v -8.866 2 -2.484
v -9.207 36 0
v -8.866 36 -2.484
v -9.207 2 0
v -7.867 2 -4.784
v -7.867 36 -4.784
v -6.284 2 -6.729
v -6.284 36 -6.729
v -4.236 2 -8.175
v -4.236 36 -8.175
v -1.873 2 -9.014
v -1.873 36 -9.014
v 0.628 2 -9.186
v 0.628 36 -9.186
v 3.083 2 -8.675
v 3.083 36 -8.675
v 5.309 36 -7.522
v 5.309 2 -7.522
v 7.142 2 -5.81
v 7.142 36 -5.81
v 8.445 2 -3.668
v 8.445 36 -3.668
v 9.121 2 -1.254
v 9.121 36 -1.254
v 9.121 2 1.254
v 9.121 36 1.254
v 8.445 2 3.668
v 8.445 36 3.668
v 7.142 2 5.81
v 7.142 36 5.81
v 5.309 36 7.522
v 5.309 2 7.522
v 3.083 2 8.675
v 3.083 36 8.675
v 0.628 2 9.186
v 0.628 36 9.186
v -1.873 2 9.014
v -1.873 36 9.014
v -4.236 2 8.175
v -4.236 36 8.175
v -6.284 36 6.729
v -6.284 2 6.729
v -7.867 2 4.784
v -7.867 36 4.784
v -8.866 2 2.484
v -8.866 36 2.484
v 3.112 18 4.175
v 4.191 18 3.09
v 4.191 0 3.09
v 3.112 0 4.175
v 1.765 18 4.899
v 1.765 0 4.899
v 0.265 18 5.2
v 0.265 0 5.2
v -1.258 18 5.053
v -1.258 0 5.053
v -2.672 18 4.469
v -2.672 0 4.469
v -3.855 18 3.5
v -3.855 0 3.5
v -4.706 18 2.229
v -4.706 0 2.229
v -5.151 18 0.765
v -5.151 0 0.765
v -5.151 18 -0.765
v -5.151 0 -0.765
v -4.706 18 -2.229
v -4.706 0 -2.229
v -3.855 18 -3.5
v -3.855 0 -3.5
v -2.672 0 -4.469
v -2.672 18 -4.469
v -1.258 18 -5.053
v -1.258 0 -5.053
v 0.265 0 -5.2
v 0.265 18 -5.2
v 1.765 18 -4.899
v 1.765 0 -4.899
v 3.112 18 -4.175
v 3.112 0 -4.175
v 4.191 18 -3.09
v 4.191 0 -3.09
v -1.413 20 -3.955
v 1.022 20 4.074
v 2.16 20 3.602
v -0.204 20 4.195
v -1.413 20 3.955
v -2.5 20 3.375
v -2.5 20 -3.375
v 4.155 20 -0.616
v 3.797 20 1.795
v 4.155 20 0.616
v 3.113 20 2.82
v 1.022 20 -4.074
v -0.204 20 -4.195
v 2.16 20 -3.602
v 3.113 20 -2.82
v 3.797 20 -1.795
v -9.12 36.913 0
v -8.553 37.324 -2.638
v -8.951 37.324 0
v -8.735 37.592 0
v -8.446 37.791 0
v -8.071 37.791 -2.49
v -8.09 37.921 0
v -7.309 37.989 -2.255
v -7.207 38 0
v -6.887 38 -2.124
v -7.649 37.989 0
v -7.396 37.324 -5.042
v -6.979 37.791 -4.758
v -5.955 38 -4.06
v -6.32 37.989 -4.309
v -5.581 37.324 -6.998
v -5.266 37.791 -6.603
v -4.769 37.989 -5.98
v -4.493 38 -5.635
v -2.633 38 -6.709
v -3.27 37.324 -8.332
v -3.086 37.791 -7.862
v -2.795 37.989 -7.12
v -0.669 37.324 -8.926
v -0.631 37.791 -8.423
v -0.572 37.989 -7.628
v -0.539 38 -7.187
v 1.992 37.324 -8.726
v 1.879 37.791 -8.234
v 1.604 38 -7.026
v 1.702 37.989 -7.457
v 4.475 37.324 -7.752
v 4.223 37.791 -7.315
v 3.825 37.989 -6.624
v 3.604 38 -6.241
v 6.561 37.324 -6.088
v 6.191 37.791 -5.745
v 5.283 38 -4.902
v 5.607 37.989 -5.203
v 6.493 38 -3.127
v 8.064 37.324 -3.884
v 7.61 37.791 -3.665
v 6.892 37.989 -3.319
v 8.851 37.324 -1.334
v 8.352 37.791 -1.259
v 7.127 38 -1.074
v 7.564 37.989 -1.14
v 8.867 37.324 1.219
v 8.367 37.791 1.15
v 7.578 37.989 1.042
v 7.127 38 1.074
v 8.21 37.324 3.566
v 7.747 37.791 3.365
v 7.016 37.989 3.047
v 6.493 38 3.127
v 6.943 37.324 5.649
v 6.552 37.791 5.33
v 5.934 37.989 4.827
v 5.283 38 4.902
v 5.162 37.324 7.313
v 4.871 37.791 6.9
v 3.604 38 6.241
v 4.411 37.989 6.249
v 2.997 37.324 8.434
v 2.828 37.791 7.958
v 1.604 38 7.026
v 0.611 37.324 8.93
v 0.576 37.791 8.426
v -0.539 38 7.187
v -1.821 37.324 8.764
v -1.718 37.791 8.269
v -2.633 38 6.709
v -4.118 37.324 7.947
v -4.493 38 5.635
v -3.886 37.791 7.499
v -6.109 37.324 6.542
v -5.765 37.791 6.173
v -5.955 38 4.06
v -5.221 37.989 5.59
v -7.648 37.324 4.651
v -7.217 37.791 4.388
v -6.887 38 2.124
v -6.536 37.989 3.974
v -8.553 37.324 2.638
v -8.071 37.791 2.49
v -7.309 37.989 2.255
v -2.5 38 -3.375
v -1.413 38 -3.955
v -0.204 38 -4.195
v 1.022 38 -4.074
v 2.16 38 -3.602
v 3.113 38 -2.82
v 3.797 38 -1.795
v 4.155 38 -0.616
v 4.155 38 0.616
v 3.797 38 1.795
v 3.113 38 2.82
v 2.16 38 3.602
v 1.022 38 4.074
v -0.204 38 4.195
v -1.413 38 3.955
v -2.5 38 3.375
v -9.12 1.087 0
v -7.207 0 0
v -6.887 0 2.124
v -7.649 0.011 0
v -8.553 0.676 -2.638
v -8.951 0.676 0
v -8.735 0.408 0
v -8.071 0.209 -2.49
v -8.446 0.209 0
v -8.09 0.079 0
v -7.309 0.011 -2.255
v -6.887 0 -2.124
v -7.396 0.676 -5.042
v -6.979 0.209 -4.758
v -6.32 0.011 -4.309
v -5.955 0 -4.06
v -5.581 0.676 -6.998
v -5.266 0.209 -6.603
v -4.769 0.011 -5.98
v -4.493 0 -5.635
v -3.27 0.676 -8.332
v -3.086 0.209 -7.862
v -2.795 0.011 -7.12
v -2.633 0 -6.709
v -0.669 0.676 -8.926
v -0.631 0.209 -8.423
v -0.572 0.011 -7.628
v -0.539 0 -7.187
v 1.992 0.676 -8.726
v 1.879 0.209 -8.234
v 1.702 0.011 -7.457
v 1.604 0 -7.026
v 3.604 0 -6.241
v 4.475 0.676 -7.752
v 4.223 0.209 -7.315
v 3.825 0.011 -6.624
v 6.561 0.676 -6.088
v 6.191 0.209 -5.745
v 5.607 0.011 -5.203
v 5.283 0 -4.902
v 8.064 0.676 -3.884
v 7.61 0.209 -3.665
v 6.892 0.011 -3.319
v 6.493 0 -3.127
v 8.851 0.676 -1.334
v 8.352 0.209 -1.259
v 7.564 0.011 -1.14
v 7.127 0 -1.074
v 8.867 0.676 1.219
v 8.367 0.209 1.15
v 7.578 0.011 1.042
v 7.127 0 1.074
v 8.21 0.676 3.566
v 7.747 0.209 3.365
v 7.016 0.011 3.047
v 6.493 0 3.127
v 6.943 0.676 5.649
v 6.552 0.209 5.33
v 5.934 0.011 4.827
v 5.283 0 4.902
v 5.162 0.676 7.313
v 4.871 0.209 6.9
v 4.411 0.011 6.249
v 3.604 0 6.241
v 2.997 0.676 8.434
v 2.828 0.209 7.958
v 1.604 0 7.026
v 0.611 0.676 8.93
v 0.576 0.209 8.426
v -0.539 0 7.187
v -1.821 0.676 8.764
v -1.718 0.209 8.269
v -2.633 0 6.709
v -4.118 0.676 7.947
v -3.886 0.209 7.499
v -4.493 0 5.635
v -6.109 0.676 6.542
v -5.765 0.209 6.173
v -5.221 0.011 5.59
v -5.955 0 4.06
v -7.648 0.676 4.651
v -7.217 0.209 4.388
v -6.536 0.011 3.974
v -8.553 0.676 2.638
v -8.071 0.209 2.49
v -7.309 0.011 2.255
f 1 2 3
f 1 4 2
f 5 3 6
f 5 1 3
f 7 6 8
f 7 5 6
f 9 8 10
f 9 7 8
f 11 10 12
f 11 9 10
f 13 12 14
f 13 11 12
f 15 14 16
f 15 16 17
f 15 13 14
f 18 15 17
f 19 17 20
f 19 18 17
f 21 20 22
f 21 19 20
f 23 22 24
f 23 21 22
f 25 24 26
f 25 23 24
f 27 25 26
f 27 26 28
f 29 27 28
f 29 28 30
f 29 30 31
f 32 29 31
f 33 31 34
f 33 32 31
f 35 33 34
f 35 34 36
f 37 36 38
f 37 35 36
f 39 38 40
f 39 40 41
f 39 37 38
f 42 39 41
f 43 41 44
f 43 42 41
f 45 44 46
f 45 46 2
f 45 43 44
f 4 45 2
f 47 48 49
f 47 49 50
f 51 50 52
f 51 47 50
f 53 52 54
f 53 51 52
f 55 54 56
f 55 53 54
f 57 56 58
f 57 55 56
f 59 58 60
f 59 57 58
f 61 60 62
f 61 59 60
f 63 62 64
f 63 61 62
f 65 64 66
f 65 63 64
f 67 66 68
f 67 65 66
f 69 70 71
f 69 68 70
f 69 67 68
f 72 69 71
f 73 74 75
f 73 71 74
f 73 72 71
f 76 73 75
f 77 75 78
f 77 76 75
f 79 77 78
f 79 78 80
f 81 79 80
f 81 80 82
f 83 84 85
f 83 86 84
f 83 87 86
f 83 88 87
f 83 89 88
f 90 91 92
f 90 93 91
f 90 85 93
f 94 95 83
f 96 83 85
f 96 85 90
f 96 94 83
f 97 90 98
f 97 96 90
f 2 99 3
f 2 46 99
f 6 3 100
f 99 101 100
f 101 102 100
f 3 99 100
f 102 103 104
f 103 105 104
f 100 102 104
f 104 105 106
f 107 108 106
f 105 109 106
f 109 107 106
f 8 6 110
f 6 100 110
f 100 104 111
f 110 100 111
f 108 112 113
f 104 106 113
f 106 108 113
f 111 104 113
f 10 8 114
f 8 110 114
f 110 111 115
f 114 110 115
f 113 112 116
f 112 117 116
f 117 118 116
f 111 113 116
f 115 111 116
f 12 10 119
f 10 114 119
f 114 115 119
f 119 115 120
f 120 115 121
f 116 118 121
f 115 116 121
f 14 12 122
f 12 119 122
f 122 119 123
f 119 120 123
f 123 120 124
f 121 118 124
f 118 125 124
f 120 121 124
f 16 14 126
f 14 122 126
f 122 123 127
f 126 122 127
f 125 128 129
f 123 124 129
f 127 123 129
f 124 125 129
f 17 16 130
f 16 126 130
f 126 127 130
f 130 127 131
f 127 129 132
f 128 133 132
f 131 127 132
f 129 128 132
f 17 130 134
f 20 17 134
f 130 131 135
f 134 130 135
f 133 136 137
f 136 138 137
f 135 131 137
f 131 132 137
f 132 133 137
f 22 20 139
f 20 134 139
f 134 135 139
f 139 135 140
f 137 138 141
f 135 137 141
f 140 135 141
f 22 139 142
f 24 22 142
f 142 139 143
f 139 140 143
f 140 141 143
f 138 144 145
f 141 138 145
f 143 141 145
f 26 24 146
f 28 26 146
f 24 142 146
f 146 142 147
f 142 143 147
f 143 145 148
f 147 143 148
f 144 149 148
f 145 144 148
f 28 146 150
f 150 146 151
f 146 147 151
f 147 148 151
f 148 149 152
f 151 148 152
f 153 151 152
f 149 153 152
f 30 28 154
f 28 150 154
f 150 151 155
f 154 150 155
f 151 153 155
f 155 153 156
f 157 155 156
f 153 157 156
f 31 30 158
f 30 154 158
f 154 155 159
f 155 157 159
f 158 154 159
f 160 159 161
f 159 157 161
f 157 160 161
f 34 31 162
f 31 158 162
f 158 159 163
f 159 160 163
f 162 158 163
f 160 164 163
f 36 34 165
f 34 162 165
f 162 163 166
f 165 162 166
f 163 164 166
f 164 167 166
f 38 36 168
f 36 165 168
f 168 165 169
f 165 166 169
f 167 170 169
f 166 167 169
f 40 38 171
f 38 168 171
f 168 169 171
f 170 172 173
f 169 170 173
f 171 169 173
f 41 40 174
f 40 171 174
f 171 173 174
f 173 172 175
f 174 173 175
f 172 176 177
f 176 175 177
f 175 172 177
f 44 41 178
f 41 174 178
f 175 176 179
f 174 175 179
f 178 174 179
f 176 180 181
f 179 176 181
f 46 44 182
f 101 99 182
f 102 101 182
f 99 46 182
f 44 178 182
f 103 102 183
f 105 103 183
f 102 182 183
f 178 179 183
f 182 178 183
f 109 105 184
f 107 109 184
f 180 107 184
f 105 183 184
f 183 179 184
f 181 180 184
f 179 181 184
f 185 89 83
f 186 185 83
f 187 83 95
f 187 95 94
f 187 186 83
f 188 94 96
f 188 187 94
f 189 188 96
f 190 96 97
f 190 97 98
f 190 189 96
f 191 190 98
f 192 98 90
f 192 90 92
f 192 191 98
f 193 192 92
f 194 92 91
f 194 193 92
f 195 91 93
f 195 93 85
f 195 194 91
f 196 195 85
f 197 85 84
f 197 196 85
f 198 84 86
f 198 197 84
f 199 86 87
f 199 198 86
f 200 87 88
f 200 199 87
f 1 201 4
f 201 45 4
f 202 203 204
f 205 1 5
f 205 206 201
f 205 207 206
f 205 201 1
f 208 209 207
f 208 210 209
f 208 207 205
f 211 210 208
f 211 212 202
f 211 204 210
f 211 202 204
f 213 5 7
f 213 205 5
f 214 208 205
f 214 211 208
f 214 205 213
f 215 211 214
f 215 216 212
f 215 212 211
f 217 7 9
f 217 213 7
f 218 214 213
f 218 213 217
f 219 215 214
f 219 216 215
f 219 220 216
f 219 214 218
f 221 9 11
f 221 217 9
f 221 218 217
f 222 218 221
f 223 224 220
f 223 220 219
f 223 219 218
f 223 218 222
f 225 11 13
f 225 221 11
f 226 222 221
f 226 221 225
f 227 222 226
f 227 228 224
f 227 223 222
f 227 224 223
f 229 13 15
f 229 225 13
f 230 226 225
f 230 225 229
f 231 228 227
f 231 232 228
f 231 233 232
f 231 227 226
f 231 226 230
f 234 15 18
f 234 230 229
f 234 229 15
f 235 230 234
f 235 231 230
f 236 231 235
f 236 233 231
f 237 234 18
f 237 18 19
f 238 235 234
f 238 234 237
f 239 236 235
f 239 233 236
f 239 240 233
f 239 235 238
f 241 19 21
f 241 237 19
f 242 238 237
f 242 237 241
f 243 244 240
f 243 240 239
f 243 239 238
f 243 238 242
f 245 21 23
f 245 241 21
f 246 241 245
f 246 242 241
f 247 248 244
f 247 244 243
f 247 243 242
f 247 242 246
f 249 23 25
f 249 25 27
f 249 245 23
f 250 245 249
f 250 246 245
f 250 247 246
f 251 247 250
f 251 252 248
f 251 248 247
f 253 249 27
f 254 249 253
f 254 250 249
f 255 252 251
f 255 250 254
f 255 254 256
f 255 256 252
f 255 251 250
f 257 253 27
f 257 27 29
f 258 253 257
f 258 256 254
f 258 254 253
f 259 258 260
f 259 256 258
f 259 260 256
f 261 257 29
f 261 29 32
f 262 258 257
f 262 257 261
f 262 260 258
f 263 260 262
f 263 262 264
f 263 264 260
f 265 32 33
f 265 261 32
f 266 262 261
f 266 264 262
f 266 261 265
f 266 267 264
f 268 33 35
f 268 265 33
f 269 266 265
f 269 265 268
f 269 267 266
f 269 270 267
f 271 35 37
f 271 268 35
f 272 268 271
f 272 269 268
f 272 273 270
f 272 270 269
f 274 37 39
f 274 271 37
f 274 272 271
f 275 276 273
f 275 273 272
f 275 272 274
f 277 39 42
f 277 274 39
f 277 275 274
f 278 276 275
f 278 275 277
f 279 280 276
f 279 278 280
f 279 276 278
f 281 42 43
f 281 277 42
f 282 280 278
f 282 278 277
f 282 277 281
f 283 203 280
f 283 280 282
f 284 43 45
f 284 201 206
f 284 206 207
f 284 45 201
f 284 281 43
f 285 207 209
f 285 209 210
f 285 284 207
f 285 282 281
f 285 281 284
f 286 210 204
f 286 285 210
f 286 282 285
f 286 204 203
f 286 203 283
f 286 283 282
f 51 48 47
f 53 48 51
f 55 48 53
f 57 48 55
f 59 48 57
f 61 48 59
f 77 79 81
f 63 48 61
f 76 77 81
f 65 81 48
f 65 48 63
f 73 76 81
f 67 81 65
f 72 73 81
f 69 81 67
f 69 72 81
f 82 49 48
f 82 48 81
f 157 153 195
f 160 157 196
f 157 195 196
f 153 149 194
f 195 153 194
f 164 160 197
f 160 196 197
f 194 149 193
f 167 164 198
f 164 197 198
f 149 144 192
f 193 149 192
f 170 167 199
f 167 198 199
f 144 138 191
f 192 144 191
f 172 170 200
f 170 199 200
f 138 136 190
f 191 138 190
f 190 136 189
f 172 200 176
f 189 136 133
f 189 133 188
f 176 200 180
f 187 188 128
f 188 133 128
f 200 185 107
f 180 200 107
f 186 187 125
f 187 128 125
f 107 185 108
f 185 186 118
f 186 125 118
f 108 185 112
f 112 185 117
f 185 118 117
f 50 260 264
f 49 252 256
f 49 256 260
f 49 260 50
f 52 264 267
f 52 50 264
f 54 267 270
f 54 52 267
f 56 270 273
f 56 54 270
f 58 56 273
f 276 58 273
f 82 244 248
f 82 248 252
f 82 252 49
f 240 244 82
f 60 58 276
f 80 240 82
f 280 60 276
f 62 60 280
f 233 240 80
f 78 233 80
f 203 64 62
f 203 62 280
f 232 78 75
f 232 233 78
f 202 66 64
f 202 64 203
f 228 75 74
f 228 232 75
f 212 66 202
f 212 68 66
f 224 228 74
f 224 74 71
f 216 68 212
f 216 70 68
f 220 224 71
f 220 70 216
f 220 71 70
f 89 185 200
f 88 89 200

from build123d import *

# Parameters (mm, degrees)
BOSS_EXTRUDE1_START = 18
BOSS_EXTRUDE1_DEPTH = 18
BOSS_EXTRUDE2_DEPTH = 18
FILLET1_SIZE        = 2


with BuildPart() as part:
    # Sketch1 → Revolve1 (revolve)
    with BuildSketch(Plane.XY):
        Polygon((-9.207, 38), (-9.207, 0), (-5.207, 0), (-5.207, 18), (0, 18), (0, 20), (-4.2, 20), (-4.2, 38), align=None)
    revolve(axis=Axis((0, 38, 0), (0, -1, 0)))

    # Sketch3 → Boss-Extrude1 (add)
    with BuildSketch(Plane(origin=(0, 20, 0), x_dir=(1, 0, 0), z_dir=(0, 1, 0)).offset(BOSS_EXTRUDE1_START)):
        with BuildLine():
            Line((-2.5, 3.374907406), (-2.5, -3.374907406))
            ThreePointArc((-2.5, -3.374907406), (-4.2, 0), (-2.5, 3.374907406))
        make_face()
    extrude(amount=-BOSS_EXTRUDE1_DEPTH)

    # Sketch2 → Boss-Extrude2 (add)
    with BuildSketch(Plane.XZ.offset(-18)):
        with BuildLine():
            ThreePointArc((5.207, 0), (4.946482892, 1.626393556), (4.191, 3.090043365))
            Line((4.191, 3.090043365), (4.191, -3.090043365))
            ThreePointArc((4.191, -3.090043365), (4.946482892, -1.626393556), (5.207, 0))
        make_face()
    extrude(amount=BOSS_EXTRUDE2_DEPTH)

    # Fillet1
    # a fillet whose section is not a circle: 2 mm, written as the material it takes off along each edge
    with BuildSketch(Plane(origin=(0, 0, 0), x_dir=(-1, 0, 0), z_dir=(0, 0, 1))) as fillet1_piece_1:
        with BuildLine():
            add(Edge.make_bspline([(9.207, -FILLET1_SIZE), (9.207, -FILLET1_SIZE * 0.831801948466), (9.207, -FILLET1_SIZE * 0.663603896932), (9.207 - FILLET1_SIZE * 0.0716919198361, -FILLET1_SIZE * 0.292893218813), (9.207 - FILLET1_SIZE * 0.292893218813, -FILLET1_SIZE * 0.0716919198361), (9.207 - FILLET1_SIZE * 0.663603896932, 0), (9.207 - FILLET1_SIZE * 0.831801948466, 0), (9.207 - FILLET1_SIZE, 0)], knots=[0, 0, 0, 0, 0, 0, 0.5, 0.5, 1, 1, 1, 1, 1, 1], degree=5))
            Line((9.207 - FILLET1_SIZE, 0), (9.207, 0))
            Line((9.207, 0), (9.207, -FILLET1_SIZE))
        make_face()
    revolve(axis=Axis((0, 0, 0), (0, -1, 0)), mode=Mode.SUBTRACT)
    with BuildSketch(Plane(origin=(0, 38, 0), x_dir=(-1, 0, 0), z_dir=(0, 0, 1))) as fillet1_piece_2:
        with BuildLine():
            add(Edge.make_bspline([(9.207, FILLET1_SIZE), (9.207, FILLET1_SIZE * 0.831801948466), (9.207, FILLET1_SIZE * 0.663603896932), (9.207 - FILLET1_SIZE * 0.0716919198361, FILLET1_SIZE * 0.292893218813), (9.207 - FILLET1_SIZE * 0.292893218813, FILLET1_SIZE * 0.0716919198361), (9.207 - FILLET1_SIZE * 0.663603896932, 0), (9.207 - FILLET1_SIZE * 0.831801948466, 0), (9.207 - FILLET1_SIZE, 0)], knots=[0, 0, 0, 0, 0, 0, 0.5, 0.5, 1, 1, 1, 1, 1, 1], degree=5))
            Line((9.207 - FILLET1_SIZE, 0), (9.207, 0))
            Line((9.207, 0), (9.207, FILLET1_SIZE))
        make_face()
    revolve(axis=Axis((0, 38, 0), (0, -1, 0)), mode=Mode.SUBTRACT)


solid = part.part
